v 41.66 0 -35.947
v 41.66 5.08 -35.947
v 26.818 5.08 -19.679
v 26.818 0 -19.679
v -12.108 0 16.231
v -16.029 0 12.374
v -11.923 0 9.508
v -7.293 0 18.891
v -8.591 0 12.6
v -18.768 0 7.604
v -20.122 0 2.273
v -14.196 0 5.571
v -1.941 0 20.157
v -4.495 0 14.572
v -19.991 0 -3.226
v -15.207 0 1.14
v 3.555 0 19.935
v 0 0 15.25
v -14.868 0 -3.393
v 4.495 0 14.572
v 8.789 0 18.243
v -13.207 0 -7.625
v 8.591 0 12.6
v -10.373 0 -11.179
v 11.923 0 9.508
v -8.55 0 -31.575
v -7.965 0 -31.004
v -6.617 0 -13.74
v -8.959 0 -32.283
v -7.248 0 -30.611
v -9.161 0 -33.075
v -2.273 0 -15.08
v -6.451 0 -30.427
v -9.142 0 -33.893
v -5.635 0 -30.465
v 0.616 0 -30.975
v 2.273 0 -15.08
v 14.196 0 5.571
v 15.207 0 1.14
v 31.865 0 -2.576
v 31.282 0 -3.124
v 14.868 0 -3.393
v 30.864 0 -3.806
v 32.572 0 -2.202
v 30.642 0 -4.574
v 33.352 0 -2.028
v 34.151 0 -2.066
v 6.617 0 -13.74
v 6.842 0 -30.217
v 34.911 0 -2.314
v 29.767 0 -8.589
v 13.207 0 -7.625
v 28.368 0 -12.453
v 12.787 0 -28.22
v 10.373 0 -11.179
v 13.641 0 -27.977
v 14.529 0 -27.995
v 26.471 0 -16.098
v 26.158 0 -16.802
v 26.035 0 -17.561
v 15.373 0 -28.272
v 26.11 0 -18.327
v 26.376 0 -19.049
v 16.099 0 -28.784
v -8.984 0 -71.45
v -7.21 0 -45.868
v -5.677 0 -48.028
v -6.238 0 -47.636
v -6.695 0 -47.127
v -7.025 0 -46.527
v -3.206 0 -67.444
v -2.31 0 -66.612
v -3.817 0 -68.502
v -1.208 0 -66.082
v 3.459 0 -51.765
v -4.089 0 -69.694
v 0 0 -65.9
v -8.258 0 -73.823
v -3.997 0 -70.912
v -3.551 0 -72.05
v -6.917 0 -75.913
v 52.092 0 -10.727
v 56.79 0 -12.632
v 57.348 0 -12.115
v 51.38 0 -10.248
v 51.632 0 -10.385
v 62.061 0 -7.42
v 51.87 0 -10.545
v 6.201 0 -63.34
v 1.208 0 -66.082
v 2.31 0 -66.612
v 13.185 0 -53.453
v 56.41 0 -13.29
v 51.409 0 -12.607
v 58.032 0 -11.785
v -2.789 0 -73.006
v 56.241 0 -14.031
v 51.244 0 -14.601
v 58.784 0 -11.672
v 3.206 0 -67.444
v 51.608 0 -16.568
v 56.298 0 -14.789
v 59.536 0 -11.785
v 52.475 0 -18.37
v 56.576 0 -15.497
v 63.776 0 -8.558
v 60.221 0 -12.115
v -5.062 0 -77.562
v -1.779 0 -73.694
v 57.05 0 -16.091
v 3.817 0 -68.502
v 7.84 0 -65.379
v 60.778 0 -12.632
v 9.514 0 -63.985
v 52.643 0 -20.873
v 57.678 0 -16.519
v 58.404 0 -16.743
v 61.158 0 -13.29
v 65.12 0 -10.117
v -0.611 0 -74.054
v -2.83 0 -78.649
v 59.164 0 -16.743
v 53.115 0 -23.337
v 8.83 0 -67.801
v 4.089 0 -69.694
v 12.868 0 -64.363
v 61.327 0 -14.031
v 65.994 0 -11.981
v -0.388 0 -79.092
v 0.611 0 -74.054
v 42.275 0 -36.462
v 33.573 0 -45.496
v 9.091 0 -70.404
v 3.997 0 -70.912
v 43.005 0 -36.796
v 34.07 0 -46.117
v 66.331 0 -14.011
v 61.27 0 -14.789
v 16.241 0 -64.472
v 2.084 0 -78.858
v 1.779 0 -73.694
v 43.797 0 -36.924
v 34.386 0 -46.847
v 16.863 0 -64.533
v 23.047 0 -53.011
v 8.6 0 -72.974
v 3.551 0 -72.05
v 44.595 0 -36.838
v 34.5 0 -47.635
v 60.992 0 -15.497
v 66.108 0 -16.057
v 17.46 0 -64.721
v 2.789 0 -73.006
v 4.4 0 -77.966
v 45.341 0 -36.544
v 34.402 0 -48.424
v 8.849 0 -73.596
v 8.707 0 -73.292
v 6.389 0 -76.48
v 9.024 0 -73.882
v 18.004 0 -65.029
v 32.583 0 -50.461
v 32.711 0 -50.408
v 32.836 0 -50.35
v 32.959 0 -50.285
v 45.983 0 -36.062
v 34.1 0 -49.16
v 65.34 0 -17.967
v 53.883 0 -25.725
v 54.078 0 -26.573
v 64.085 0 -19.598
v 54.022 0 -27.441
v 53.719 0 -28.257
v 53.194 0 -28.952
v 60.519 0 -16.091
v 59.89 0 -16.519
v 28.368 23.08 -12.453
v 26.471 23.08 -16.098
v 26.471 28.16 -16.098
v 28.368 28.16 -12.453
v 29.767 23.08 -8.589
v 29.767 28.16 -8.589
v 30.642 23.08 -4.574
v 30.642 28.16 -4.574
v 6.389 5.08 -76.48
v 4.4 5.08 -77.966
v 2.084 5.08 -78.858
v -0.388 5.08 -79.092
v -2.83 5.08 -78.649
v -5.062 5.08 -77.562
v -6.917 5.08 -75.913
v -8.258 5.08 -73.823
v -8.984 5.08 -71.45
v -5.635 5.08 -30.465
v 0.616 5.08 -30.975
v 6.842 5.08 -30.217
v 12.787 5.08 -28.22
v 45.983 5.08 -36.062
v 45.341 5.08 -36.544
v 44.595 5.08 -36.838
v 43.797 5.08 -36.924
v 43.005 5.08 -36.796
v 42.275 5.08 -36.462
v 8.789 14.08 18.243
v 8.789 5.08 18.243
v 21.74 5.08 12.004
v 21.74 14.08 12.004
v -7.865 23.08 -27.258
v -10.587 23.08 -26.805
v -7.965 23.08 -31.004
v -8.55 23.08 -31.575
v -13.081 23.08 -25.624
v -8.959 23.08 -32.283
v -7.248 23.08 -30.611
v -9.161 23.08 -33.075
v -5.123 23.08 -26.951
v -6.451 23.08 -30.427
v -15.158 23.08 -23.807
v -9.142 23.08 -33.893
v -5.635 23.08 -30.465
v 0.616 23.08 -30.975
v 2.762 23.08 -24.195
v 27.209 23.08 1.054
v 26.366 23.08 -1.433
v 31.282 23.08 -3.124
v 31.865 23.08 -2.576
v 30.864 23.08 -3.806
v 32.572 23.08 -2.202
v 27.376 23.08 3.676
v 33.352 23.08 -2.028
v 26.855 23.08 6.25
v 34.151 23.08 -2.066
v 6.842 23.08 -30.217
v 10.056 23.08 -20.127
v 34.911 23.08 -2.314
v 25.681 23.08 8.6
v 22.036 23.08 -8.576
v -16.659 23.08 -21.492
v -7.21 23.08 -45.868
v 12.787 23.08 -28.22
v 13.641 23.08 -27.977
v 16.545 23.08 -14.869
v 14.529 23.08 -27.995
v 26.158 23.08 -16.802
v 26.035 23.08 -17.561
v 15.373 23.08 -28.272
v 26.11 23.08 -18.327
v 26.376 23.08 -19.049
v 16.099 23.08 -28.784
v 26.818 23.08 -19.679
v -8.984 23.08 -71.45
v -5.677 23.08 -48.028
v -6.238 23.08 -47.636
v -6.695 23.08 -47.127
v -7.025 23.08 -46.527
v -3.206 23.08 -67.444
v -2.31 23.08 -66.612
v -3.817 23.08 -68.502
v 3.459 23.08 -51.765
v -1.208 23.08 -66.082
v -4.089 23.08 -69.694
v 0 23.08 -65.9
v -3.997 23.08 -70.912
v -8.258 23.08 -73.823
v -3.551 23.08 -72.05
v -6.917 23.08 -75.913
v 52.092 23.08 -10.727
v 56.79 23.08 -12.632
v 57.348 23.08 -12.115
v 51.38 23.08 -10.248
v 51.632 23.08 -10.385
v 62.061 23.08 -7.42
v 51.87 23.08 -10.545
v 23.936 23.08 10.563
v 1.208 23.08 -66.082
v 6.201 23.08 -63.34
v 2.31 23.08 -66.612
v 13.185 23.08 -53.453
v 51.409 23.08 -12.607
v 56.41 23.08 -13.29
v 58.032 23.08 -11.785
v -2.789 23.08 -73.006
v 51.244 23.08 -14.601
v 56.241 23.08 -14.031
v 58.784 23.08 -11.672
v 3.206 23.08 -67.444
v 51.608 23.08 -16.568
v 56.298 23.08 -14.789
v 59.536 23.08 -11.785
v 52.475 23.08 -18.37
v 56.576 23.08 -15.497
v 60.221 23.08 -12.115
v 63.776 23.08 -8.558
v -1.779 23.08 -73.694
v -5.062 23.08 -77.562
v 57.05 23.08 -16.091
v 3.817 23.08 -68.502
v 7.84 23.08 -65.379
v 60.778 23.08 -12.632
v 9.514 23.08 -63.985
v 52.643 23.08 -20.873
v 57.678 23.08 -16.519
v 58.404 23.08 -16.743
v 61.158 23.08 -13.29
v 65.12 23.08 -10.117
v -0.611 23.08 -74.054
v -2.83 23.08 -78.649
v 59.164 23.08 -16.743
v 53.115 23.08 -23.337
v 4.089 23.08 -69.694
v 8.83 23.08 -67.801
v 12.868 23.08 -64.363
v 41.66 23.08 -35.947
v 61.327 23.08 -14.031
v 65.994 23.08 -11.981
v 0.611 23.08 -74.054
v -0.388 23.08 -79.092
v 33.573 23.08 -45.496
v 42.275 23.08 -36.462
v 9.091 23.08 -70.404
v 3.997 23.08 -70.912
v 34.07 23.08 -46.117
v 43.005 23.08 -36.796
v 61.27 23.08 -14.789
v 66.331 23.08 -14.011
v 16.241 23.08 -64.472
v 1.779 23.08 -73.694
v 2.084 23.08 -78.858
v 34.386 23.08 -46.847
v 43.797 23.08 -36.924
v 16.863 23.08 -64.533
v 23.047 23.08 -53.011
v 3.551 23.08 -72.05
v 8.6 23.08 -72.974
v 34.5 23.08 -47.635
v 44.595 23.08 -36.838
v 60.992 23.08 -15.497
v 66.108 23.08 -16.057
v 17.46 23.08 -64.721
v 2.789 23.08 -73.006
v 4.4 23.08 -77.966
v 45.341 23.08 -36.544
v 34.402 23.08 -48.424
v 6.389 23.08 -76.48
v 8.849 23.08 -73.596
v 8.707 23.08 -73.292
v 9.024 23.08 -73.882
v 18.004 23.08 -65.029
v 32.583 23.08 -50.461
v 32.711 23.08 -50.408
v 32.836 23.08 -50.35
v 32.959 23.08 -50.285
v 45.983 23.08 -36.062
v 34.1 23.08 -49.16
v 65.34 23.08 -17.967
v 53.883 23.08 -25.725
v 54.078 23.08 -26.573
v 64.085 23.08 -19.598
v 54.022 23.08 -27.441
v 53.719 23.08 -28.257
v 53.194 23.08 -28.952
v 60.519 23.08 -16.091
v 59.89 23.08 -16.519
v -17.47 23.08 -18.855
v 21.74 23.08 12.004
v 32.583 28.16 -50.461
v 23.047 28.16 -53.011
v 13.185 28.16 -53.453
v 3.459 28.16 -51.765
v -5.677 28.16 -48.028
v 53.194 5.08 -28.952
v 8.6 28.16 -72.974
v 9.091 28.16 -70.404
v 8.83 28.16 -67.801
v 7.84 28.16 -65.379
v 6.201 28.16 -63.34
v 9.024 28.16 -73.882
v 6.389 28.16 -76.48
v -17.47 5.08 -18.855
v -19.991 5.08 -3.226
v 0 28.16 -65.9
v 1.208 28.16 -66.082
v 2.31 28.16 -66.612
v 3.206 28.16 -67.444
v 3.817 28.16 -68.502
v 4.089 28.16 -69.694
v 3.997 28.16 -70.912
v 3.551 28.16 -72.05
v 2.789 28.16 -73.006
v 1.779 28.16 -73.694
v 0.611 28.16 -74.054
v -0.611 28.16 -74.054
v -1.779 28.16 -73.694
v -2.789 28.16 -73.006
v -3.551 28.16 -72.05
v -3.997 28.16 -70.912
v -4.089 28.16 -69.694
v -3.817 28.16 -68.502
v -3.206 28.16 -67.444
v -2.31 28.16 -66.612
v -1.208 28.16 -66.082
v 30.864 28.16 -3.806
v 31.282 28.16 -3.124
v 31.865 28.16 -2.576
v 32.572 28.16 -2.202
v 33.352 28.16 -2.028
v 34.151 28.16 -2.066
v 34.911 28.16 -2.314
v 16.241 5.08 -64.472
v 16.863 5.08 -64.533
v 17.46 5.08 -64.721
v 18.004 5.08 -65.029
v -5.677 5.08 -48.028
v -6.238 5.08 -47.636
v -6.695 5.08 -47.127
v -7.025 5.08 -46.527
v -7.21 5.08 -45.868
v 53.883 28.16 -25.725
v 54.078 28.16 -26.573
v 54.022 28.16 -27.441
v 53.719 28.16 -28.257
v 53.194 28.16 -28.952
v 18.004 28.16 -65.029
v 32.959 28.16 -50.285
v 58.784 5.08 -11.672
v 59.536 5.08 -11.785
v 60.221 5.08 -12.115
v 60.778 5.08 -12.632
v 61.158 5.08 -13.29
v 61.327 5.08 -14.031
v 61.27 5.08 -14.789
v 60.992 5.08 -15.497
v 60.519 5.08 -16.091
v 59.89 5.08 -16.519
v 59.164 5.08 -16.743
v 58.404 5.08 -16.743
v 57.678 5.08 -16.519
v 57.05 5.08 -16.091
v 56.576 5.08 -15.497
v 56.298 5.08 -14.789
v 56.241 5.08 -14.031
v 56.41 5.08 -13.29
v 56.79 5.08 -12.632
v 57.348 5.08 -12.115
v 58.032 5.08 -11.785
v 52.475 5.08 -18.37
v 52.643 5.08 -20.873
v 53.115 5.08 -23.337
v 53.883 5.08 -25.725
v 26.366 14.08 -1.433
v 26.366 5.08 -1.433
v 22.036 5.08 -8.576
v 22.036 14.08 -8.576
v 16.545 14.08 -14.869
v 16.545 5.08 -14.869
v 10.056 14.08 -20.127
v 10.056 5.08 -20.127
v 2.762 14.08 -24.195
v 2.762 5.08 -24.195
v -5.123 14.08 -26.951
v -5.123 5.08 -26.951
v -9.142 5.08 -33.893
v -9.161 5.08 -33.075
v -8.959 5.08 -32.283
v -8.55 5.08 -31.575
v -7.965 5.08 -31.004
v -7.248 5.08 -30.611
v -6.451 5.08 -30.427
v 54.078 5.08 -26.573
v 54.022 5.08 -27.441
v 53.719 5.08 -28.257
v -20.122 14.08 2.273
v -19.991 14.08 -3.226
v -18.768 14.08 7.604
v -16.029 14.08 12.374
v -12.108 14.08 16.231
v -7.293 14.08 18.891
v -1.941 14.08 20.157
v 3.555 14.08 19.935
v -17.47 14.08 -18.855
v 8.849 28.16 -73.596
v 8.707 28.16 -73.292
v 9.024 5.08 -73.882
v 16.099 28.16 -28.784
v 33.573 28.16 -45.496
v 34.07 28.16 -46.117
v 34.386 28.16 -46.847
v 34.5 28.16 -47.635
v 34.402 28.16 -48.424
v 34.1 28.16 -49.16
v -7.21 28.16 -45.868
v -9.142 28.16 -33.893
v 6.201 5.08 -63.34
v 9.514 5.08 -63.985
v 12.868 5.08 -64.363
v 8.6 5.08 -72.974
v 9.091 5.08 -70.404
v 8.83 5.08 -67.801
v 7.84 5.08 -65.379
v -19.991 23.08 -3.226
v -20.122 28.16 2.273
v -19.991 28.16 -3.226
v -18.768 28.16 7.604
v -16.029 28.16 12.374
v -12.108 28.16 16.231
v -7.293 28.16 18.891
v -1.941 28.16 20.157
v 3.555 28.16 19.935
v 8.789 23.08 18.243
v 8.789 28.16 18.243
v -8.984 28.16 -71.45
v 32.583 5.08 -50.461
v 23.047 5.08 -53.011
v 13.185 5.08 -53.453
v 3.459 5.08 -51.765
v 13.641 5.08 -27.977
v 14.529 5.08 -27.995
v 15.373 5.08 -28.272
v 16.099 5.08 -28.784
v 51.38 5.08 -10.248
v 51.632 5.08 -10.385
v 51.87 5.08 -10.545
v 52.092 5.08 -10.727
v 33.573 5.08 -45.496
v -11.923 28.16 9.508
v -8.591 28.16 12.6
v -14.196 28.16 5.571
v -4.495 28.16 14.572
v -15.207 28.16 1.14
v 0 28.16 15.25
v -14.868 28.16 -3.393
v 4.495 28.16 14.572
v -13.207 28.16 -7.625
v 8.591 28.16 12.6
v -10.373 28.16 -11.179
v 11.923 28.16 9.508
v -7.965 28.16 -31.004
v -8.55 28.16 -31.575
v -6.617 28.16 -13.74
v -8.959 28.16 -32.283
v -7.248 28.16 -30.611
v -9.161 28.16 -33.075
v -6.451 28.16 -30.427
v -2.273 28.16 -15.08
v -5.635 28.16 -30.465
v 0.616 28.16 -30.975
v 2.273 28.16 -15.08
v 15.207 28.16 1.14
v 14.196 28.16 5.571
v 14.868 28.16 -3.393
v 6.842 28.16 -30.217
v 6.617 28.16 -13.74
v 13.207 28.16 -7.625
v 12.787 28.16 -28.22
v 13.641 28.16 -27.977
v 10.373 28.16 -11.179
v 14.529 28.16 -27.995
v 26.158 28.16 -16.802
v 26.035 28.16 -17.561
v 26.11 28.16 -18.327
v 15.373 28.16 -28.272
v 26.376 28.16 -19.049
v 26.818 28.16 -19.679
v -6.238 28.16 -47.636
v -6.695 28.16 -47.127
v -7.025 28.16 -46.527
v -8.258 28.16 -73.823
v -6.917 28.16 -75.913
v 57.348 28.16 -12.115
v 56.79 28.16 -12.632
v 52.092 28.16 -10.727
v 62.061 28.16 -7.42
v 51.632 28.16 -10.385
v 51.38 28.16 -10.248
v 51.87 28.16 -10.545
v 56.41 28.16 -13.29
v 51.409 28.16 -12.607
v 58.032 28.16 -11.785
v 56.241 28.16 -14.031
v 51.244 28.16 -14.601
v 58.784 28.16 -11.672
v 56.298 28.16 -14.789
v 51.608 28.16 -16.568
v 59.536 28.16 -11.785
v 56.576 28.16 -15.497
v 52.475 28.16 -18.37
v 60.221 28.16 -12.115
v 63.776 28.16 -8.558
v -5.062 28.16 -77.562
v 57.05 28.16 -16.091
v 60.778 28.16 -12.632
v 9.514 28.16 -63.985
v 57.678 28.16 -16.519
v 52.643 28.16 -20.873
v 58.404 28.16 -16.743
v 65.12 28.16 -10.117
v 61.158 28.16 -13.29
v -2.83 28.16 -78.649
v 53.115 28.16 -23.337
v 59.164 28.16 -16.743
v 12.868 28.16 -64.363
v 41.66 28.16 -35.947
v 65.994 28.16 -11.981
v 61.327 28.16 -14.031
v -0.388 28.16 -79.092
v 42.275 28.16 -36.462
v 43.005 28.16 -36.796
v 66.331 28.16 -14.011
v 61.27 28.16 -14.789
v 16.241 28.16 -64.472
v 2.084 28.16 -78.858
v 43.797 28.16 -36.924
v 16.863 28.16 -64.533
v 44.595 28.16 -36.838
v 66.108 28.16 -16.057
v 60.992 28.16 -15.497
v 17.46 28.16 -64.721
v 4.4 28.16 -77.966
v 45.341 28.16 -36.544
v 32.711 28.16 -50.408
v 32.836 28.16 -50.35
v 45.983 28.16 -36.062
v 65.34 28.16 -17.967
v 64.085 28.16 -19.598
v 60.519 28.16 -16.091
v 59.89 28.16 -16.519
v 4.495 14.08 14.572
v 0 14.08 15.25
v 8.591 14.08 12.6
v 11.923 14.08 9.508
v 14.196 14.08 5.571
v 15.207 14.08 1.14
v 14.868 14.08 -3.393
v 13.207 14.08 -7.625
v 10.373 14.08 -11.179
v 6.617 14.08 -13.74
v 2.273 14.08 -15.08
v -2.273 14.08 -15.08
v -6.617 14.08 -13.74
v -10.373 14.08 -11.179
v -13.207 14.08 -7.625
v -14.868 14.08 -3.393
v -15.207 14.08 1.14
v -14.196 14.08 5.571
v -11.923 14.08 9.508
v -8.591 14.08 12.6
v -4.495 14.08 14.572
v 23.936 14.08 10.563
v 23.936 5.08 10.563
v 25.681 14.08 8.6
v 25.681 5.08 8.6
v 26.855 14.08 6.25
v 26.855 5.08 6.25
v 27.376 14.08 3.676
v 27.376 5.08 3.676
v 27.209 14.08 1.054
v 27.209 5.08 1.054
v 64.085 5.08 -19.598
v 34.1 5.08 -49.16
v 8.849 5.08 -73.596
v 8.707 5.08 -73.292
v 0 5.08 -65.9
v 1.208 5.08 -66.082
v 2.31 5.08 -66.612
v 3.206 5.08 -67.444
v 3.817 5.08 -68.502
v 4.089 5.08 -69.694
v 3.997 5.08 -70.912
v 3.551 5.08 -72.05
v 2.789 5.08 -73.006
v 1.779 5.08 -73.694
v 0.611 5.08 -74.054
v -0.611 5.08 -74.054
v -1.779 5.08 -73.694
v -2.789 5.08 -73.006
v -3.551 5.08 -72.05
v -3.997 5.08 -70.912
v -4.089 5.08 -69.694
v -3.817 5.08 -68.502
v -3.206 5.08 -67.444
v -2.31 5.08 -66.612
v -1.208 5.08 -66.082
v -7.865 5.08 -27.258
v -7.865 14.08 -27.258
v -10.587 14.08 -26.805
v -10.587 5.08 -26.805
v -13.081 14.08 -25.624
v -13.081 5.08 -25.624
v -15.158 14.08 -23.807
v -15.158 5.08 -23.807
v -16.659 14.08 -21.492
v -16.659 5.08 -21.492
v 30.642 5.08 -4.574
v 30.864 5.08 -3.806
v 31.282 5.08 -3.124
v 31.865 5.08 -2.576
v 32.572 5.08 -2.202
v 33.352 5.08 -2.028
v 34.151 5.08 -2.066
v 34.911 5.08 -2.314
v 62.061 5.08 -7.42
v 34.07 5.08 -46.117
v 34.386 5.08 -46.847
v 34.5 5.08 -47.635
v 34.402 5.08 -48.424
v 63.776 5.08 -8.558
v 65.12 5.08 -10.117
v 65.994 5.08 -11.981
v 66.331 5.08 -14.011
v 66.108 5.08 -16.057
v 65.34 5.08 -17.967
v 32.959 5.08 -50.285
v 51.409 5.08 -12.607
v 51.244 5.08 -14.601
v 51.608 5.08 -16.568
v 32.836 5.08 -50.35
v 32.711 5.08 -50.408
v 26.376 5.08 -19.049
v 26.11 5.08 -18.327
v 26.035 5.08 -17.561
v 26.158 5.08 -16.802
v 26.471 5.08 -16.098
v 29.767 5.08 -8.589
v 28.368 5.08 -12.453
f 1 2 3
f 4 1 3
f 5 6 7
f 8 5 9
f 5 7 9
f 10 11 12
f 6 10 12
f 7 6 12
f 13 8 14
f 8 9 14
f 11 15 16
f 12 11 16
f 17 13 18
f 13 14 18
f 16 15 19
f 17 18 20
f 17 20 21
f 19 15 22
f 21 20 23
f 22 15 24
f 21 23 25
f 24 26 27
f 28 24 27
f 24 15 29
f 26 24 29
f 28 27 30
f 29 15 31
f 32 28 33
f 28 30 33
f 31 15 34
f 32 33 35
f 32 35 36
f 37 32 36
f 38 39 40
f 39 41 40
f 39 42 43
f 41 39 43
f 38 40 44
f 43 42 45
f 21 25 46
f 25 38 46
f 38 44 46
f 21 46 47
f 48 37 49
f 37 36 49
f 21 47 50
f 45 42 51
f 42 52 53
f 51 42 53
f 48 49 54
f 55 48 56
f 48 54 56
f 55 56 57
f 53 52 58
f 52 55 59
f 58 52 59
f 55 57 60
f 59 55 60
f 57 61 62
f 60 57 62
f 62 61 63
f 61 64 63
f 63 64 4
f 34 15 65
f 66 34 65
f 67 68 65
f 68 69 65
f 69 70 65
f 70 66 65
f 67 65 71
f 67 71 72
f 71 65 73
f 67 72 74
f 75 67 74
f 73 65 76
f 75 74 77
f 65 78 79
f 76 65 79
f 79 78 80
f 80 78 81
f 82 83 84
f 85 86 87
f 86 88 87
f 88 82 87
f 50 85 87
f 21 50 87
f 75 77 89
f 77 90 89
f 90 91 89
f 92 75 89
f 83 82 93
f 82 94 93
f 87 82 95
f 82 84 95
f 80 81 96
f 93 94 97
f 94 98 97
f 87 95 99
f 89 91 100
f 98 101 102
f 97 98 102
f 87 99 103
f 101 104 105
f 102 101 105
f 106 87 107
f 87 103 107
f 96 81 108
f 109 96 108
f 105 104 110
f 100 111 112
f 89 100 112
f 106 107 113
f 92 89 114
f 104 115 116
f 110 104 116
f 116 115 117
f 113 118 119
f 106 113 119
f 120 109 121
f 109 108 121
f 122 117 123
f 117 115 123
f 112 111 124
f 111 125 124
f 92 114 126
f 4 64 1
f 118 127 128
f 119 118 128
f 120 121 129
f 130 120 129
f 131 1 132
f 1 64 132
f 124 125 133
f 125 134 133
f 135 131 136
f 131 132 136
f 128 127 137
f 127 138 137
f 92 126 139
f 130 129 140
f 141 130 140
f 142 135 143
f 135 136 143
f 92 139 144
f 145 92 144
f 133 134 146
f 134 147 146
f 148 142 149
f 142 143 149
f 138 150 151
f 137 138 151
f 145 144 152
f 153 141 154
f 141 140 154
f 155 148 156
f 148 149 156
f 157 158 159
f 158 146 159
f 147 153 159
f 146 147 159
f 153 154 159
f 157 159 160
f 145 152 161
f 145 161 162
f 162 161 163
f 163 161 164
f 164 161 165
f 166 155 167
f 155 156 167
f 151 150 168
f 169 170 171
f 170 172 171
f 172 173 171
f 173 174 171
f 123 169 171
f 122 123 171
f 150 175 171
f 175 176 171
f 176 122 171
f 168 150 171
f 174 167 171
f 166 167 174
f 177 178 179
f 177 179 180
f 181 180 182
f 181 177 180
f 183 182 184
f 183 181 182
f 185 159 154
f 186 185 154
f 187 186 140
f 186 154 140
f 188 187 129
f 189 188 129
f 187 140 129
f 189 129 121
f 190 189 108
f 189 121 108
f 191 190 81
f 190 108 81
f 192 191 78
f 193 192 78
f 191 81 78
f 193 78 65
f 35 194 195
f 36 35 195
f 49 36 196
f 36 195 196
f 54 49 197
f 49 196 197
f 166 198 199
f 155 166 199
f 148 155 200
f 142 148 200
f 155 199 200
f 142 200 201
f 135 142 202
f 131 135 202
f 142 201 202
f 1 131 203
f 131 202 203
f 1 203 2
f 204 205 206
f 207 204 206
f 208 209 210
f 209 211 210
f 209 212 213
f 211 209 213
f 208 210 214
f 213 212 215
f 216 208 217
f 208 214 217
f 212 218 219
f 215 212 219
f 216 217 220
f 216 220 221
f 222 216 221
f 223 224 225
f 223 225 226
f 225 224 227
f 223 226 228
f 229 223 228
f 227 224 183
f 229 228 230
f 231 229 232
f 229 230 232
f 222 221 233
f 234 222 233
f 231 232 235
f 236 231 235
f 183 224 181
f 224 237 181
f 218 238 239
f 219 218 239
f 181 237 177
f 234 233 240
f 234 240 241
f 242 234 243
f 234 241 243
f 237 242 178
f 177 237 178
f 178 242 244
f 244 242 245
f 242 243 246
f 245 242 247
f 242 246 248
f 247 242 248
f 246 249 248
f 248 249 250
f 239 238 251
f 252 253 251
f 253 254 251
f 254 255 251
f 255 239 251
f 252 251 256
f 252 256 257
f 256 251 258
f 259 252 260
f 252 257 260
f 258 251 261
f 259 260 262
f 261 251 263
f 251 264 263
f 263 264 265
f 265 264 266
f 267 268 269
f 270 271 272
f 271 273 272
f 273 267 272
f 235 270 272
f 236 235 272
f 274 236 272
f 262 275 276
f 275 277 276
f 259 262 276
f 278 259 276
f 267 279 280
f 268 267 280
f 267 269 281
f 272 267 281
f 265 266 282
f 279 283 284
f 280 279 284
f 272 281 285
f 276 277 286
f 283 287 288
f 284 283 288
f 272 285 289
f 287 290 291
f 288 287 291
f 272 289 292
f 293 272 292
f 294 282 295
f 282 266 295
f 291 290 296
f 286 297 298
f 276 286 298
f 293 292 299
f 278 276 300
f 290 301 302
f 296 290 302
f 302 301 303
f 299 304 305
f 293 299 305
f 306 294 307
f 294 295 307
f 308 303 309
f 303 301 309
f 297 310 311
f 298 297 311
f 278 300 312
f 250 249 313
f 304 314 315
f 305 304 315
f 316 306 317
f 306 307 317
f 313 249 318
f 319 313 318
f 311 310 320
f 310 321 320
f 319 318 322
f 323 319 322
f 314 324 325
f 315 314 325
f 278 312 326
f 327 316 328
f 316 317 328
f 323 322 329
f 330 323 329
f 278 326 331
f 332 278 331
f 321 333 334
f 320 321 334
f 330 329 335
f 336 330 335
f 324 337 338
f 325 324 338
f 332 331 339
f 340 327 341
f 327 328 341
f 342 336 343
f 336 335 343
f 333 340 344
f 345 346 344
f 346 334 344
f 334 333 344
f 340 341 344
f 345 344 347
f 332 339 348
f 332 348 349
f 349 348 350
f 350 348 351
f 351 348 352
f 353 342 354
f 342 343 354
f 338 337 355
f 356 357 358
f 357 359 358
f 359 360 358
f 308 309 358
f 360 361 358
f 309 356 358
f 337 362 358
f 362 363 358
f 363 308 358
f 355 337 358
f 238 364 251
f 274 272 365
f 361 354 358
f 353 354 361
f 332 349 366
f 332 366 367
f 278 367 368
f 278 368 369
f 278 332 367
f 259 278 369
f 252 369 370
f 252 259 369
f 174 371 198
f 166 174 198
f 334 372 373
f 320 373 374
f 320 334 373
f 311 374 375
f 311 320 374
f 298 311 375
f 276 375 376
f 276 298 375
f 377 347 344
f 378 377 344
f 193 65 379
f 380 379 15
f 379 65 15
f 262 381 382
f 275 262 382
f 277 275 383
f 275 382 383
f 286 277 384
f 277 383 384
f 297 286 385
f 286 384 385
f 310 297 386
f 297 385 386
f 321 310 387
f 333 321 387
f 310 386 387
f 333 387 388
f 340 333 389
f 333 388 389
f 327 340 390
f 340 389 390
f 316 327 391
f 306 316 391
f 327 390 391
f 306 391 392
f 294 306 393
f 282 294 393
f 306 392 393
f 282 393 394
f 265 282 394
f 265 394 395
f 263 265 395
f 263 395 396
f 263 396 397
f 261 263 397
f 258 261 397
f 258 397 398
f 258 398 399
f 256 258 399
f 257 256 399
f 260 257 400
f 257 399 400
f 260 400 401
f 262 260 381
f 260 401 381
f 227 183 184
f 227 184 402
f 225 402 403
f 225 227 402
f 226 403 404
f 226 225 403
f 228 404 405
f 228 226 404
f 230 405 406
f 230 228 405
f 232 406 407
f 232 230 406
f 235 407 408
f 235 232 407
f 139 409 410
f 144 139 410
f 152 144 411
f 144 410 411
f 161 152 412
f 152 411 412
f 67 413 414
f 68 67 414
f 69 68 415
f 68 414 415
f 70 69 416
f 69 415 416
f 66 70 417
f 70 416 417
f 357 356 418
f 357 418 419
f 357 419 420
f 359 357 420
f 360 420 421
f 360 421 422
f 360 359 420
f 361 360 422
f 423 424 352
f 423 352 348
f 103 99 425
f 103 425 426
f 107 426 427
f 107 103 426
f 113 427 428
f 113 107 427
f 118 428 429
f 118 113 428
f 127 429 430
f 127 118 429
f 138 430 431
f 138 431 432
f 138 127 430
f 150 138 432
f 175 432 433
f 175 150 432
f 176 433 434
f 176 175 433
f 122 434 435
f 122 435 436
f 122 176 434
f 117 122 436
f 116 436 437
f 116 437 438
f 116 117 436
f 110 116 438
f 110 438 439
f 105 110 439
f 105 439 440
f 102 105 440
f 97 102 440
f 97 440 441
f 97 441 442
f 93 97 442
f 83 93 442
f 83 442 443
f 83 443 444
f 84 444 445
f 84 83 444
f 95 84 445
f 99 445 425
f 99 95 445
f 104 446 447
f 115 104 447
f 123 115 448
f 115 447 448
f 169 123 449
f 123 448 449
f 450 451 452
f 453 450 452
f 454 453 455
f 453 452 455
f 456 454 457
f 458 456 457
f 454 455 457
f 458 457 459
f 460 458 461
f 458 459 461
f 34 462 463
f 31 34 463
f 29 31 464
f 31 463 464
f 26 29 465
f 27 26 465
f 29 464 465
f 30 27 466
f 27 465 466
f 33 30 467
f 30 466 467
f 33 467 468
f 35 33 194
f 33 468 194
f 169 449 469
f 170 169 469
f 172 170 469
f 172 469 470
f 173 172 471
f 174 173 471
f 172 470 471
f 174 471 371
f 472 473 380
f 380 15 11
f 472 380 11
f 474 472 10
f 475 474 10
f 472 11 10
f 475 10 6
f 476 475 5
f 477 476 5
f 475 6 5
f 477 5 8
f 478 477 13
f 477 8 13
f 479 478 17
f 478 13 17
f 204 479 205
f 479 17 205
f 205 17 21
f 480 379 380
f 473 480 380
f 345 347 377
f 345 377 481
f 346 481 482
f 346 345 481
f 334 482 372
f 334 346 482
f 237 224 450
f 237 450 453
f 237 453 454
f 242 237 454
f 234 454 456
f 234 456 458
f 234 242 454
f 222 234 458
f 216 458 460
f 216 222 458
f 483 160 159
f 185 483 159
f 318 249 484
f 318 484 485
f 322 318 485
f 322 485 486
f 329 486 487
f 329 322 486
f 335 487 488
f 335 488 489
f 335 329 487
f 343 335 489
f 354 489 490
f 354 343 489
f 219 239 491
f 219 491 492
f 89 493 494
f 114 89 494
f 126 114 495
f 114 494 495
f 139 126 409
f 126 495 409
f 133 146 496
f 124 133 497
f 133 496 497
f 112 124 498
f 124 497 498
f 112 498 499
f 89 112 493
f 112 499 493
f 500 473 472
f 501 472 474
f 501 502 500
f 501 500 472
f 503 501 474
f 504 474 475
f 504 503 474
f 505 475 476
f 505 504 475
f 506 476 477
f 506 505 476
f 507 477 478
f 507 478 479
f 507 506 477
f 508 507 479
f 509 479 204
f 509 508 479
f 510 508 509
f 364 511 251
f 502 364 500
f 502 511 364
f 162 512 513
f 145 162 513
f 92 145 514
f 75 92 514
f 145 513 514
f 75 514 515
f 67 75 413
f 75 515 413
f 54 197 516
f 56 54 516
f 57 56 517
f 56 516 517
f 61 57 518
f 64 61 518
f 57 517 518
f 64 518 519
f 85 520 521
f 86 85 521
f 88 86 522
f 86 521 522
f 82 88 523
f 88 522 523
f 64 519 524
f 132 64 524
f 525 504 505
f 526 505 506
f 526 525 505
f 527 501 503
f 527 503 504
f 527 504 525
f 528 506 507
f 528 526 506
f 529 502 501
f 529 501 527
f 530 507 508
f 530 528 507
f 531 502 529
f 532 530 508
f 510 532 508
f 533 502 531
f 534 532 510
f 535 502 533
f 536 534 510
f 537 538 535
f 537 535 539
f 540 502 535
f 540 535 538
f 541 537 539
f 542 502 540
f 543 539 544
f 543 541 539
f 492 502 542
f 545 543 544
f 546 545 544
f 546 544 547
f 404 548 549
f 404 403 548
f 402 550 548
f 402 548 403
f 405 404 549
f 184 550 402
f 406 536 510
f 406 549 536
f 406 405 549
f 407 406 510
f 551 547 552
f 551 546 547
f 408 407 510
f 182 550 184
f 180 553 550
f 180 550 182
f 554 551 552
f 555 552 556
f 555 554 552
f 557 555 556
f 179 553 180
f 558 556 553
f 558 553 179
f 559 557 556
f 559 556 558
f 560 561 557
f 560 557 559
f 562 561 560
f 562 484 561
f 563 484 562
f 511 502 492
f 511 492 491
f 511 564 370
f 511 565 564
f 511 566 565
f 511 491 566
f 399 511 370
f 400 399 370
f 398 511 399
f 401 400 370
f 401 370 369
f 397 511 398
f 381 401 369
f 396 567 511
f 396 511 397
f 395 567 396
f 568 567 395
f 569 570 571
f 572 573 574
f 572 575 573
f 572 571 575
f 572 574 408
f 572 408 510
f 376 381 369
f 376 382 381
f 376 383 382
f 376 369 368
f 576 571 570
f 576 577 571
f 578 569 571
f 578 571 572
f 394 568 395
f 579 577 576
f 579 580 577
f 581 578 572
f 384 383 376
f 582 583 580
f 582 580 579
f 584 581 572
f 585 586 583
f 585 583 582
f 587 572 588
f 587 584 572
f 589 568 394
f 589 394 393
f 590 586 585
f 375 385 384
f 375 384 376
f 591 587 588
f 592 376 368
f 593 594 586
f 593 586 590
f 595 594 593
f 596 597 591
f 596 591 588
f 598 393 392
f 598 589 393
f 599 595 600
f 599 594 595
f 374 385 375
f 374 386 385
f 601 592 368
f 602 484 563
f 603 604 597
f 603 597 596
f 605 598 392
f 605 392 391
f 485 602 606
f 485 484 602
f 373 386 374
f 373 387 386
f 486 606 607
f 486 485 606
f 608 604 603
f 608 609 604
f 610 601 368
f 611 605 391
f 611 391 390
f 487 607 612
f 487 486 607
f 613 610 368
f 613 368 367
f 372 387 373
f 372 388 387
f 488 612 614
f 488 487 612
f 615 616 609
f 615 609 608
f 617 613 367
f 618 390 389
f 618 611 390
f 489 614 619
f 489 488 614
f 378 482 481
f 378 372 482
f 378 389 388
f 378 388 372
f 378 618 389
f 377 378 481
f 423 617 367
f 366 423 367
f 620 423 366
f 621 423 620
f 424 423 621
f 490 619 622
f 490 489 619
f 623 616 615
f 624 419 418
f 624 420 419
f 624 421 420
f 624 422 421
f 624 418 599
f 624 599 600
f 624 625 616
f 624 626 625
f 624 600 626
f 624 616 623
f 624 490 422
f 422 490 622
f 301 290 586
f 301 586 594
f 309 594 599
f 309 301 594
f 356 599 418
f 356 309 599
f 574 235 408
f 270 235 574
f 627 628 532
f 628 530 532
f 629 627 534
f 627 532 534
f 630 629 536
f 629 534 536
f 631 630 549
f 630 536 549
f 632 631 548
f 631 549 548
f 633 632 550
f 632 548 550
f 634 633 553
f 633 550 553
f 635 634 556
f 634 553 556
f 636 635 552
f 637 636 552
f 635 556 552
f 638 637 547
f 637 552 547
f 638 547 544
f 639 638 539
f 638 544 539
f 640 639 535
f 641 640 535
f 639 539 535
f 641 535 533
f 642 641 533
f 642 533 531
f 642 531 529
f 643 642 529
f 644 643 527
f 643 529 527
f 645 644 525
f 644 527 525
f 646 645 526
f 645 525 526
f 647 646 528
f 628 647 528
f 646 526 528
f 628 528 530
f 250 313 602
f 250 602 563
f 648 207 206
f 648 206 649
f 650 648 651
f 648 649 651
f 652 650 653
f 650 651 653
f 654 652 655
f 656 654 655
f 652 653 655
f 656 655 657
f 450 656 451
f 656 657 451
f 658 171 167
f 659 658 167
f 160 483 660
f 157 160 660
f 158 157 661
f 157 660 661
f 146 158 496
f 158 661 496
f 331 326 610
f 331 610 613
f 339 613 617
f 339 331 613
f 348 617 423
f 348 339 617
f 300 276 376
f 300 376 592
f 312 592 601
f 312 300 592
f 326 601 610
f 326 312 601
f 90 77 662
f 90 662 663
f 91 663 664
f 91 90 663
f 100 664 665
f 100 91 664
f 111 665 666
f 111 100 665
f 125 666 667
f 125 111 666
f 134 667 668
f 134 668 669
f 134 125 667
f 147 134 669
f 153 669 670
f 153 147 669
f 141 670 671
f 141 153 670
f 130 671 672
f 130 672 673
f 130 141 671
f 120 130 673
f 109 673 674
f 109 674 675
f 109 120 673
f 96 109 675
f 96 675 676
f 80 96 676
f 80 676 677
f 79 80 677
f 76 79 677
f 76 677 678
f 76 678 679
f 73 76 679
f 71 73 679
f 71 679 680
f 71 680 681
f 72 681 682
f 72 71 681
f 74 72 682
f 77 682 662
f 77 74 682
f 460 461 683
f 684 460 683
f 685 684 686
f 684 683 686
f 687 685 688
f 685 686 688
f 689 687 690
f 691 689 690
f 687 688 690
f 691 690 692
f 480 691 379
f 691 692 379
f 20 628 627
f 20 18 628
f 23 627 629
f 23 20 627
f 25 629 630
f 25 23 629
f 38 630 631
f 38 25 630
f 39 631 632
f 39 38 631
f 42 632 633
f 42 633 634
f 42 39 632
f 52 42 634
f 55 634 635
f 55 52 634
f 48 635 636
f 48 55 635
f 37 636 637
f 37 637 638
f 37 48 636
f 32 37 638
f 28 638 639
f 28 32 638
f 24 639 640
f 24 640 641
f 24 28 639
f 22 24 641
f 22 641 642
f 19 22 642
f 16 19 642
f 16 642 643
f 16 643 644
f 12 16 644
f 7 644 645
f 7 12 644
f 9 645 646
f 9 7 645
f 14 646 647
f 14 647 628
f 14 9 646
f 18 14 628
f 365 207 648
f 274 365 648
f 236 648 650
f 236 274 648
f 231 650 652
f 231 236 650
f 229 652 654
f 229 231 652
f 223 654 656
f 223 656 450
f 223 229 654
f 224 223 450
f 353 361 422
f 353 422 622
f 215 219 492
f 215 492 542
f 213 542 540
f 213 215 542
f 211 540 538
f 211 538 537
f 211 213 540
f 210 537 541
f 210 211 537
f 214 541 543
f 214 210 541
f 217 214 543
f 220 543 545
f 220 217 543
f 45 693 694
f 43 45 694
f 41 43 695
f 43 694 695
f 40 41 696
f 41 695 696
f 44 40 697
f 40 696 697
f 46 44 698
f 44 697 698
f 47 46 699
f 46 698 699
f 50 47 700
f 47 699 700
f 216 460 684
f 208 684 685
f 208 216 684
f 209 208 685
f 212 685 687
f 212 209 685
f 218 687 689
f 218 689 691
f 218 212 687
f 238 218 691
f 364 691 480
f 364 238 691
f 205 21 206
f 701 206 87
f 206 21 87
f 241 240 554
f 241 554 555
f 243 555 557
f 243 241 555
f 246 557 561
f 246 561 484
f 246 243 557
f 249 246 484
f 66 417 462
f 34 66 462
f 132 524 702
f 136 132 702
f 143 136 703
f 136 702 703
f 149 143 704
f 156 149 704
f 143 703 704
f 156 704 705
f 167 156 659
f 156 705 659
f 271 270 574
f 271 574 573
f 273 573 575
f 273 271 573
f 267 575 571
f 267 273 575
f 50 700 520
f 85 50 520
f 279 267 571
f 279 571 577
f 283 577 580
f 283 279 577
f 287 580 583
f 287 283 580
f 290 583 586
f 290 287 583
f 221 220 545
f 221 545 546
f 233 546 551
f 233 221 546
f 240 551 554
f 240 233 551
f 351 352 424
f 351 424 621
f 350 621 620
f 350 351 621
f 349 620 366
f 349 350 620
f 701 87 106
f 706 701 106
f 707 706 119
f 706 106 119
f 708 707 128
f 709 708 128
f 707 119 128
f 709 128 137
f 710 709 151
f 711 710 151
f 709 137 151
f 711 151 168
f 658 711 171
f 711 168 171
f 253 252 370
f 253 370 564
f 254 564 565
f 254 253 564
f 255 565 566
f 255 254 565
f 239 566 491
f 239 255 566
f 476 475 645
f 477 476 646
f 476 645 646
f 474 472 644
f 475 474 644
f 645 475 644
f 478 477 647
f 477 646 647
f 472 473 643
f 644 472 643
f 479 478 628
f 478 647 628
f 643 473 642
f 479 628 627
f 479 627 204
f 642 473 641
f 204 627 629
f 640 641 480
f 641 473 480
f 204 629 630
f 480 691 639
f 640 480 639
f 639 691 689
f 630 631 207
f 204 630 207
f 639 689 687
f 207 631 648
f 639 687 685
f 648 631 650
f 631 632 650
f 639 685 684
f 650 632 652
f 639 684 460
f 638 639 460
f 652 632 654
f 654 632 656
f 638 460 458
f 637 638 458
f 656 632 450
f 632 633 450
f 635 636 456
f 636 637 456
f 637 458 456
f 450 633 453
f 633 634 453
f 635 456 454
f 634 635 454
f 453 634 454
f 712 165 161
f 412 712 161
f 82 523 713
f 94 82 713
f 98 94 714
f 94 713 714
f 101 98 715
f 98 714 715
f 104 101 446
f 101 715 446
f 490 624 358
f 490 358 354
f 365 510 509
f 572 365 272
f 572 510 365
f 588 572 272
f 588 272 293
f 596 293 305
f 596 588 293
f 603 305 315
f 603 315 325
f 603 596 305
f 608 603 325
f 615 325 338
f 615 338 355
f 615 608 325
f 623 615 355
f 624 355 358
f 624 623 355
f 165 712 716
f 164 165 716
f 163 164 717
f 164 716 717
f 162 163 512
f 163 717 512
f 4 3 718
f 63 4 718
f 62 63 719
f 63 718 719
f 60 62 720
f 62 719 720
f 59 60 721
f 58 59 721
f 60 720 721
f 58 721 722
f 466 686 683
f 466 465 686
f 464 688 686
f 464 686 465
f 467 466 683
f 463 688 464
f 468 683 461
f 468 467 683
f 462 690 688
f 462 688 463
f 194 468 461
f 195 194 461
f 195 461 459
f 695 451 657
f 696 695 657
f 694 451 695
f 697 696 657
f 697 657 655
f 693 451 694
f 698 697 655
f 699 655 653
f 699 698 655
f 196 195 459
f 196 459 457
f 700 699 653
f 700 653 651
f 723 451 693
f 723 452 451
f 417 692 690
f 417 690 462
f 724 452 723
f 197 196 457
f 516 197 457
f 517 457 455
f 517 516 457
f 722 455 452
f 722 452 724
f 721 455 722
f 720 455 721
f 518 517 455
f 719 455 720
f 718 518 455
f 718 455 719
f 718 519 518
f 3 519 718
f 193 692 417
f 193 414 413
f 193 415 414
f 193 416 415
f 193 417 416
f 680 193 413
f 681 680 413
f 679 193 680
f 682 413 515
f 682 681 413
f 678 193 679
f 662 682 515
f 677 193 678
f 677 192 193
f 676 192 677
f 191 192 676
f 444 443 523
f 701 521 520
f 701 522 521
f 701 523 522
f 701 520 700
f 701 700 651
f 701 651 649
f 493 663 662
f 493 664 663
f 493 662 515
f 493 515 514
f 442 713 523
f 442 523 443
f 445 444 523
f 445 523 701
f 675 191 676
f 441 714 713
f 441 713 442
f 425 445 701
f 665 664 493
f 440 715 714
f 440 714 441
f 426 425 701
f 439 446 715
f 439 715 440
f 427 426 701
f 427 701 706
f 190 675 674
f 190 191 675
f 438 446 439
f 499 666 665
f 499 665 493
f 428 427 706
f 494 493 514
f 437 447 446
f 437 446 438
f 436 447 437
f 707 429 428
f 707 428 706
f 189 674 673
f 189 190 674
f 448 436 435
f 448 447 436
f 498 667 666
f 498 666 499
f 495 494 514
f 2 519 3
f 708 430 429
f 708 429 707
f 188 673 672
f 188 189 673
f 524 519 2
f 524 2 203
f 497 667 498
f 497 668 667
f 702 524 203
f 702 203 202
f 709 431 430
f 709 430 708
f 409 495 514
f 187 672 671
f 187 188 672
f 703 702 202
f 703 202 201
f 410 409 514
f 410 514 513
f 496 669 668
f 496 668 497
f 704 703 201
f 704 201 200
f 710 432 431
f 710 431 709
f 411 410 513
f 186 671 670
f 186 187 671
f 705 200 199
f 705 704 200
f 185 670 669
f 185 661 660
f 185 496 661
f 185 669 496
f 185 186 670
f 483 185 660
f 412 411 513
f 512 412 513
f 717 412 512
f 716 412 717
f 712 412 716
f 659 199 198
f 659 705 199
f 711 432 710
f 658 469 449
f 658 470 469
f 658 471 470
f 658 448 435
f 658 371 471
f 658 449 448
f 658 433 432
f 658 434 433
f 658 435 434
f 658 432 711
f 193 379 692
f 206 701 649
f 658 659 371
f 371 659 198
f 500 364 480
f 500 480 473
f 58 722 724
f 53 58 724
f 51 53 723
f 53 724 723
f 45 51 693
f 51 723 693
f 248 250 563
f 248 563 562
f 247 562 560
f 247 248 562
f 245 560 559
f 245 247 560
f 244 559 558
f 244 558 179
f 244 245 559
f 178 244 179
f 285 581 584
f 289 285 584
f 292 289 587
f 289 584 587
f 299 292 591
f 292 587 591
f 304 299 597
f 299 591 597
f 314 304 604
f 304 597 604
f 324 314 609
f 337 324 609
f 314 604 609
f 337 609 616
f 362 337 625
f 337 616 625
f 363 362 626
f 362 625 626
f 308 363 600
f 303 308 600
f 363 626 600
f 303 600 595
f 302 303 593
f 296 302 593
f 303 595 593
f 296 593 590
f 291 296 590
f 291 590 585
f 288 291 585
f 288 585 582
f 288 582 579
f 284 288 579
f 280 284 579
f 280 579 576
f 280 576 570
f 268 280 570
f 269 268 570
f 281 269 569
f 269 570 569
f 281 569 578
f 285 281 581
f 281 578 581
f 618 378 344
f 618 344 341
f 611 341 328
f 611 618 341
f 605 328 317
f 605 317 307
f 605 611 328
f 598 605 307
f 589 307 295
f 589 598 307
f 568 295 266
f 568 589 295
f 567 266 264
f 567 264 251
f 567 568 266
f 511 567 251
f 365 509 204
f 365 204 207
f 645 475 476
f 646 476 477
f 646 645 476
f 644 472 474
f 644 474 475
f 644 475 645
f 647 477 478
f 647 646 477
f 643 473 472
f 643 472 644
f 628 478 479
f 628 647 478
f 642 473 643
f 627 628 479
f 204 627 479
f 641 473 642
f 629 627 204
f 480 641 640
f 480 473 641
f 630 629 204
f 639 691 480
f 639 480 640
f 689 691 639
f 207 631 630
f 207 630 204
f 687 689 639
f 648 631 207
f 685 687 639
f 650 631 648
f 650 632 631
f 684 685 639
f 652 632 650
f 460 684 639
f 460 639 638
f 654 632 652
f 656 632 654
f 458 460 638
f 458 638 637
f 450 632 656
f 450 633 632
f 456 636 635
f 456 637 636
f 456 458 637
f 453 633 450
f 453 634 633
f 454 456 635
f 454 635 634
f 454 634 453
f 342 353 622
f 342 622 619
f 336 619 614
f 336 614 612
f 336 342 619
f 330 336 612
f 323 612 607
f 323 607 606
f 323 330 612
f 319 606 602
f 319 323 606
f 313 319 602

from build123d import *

# Parameters (mm, degrees)
SKETCH1_R           = 15.25
SKETCH1_R_2         = 4.1
SKETCH1_R_3         = 2.55
BOSS_EXTRUDE1_DEPTH = 5.08
CUT_EXTRUDE1_DEPTH  = 104.357750841
SKETCH2_R           = 15.25
BOSS_EXTRUDE2_DEPTH = 9


with BuildPart() as part:
    # Sketch1 → Boss-Extrude1 (new body)
    with BuildSketch(Plane(origin=(0, 0, 0), x_dir=(1, 0, 0), z_dir=(0, 1, 0))):
        with BuildLine():
            ThreePointArc((6.388793728, 76.480224896), (-2.830297402, 78.648665598), (-8.98381599, 71.4495))
            Line((-8.98381599, 71.4495), (-19.99145866, 3.225535714))
            ThreePointArc((-19.99145866, 3.225535714), (-12.108045484, -16.231381166), (8.788641521, -18.243417449))
            Line((8.788641521, -18.243417449), (62.060818364, 7.420089218))
            ThreePointArc((62.060818364, 7.420089218), (66.231922008, 12.984242387), (64.084658197, 19.598406297))
            Line((64.084658197, 19.598406297), (6.388793728, 76.480224896))
        make_face()
        with Locations(Location((0, 0, 0), (0, 0, 270))):
            Circle(SKETCH1_R, mode=Mode.SUBTRACT)
        with Locations(Location((0, 70, 0), (0, 0, 270))):
            Circle(SKETCH1_R_2, mode=Mode.SUBTRACT)
        with Locations(Location((58.784065599, 14.221955971, 0), (0, 0, 270))):
            Circle(SKETCH1_R_3, mode=Mode.SUBTRACT)
    extrude(amount=BOSS_EXTRUDE1_DEPTH)

    # Sketch3 → Cut-Extrude1 (cut, through all)
    with BuildSketch(Plane(origin=(0, 5.08, 0), x_dir=(1, 0, 0), z_dir=(0, 1, 0))):
        with BuildLine():
            ThreePointArc((8.600301495, 72.974023234), (8.830276845, 67.800861343), (6.200943015, 63.33979687))
            ThreePointArc((6.200943015, 63.33979687), (11.186994823, 64.207277059), (16.240998391, 64.472385422))
            ThreePointArc((16.240998391, 64.472385422), (17.166470838, 64.611402608), (18.00407674, 65.028824916))
            Line((18.00407674, 65.028824916), (9.02432344, 73.881880555))
            ThreePointArc((9.02432344, 73.881880555), (8.77414149, 73.445779951), (8.600301495, 72.974023234))
        make_face()
        with BuildLine():
            Line((34.099858287, 49.160142912), (32.958846213, 50.285056151))
            ThreePointArc((32.958846213, 50.285056151), (32.774050848, 50.379706816), (32.58315136, 50.461349092))
            ThreePointArc((32.58315136, 50.461349092), (13.185320482, 53.452715312), (-5.677316258, 48.028229173))
            ThreePointArc((-5.677316258, 48.028229173), (-6.694823792, 47.126566129), (-7.209864768, 45.868372734))
            Line((-7.209864768, 45.868372734), (-9.14210444, 33.892597873))
            ThreePointArc((-9.14210444, 33.892597873), (-8.27727116, 31.269243094), (-5.634779955, 30.464776107))
            ThreePointArc((-5.634779955, 30.464776107), (3.748269643, 30.753923377), (12.787186342, 28.219517959))
            ThreePointArc((12.787186342, 28.219517959), (14.529455805, 27.994719178), (16.098886301, 28.783975343))
            Line((16.098886301, 28.783975343), (33.573138468, 45.495752457))
            ThreePointArc((33.573138468, 45.495752457), (34.469127397, 47.237013531), (34.099858287, 49.160142912))
        make_face()
        with BuildLine():
            ThreePointArc((51.379712462, 10.247922916), (51.752895163, 10.461938371), (52.091630475, 10.727129493))
            ThreePointArc((52.091630475, 10.727129493), (51.243569136, 14.600655176), (52.47545713, 18.369721535))
            ThreePointArc((52.47545713, 18.369721535), (52.841609732, 22.111780263), (53.882830405, 25.724664257))
            ThreePointArc((53.882830405, 25.724664257), (54.022128776, 27.441380165), (53.194351236, 28.951778089))
            Line((53.194351236, 28.951778089), (45.982611804, 36.061765224))
            ThreePointArc((45.982611804, 36.061765224), (43.797075038, 36.924377996), (41.660206693, 35.947410531))
            Line((41.660206693, 35.947410531), (26.817680132, 19.679151335))
            ThreePointArc((26.817680132, 19.679151335), (26.047876945, 17.946527743), (26.470681024, 16.098334526))
            ThreePointArc((26.470681024, 16.098334526), (29.131872304, 10.544540978), (30.64197964, 4.574102331))
            ThreePointArc((30.64197964, 4.574102331), (32.205598333, 2.365574193), (34.911124199, 2.31429321))
            Line((34.911124199, 2.31429321), (51.379712462, 10.247922916))
        make_face()
    extrude(amount=-CUT_EXTRUDE1_DEPTH, mode=Mode.SUBTRACT)

    # Sketch2 → Boss-Extrude2 (add)
    with BuildSketch(Plane(origin=(0, 5.08, 0), x_dir=(1, 0, 0), z_dir=(0, 1, 0))):
        with BuildLine():
            Line((8.788641521, -18.243417449), (21.739699458, -12.004333908))
            ThreePointArc((21.739699458, -12.004333908), (26.855071446, -6.250176498), (26.365507295, 1.433421945))
            ThreePointArc((26.365507295, 1.433421945), (13.414022408, 17.638190532), (-5.122751892, 26.950734989))
            ThreePointArc((-5.122751892, 26.950734989), (-13.080870345, 25.624316472), (-17.469770841, 18.854634956))
            Line((-17.469770841, 18.854634956), (-19.99145866, 3.225535714))
            ThreePointArc((-19.99145866, 3.225535714), (-12.108045484, -16.231381166), (8.788641521, -18.243417449))
        make_face()
        with Locations(Location((0, 0, 0), (0, 0, 270))):
            Circle(SKETCH2_R, mode=Mode.SUBTRACT)
    extrude(amount=BOSS_EXTRUDE2_DEPTH)


with BuildPart() as body_2:
    # Mirror1: mirrored copy
    add(part.part.mirror(Plane.ZX.offset(14.08)))


solid = Compound([part.part, body_2.part])
